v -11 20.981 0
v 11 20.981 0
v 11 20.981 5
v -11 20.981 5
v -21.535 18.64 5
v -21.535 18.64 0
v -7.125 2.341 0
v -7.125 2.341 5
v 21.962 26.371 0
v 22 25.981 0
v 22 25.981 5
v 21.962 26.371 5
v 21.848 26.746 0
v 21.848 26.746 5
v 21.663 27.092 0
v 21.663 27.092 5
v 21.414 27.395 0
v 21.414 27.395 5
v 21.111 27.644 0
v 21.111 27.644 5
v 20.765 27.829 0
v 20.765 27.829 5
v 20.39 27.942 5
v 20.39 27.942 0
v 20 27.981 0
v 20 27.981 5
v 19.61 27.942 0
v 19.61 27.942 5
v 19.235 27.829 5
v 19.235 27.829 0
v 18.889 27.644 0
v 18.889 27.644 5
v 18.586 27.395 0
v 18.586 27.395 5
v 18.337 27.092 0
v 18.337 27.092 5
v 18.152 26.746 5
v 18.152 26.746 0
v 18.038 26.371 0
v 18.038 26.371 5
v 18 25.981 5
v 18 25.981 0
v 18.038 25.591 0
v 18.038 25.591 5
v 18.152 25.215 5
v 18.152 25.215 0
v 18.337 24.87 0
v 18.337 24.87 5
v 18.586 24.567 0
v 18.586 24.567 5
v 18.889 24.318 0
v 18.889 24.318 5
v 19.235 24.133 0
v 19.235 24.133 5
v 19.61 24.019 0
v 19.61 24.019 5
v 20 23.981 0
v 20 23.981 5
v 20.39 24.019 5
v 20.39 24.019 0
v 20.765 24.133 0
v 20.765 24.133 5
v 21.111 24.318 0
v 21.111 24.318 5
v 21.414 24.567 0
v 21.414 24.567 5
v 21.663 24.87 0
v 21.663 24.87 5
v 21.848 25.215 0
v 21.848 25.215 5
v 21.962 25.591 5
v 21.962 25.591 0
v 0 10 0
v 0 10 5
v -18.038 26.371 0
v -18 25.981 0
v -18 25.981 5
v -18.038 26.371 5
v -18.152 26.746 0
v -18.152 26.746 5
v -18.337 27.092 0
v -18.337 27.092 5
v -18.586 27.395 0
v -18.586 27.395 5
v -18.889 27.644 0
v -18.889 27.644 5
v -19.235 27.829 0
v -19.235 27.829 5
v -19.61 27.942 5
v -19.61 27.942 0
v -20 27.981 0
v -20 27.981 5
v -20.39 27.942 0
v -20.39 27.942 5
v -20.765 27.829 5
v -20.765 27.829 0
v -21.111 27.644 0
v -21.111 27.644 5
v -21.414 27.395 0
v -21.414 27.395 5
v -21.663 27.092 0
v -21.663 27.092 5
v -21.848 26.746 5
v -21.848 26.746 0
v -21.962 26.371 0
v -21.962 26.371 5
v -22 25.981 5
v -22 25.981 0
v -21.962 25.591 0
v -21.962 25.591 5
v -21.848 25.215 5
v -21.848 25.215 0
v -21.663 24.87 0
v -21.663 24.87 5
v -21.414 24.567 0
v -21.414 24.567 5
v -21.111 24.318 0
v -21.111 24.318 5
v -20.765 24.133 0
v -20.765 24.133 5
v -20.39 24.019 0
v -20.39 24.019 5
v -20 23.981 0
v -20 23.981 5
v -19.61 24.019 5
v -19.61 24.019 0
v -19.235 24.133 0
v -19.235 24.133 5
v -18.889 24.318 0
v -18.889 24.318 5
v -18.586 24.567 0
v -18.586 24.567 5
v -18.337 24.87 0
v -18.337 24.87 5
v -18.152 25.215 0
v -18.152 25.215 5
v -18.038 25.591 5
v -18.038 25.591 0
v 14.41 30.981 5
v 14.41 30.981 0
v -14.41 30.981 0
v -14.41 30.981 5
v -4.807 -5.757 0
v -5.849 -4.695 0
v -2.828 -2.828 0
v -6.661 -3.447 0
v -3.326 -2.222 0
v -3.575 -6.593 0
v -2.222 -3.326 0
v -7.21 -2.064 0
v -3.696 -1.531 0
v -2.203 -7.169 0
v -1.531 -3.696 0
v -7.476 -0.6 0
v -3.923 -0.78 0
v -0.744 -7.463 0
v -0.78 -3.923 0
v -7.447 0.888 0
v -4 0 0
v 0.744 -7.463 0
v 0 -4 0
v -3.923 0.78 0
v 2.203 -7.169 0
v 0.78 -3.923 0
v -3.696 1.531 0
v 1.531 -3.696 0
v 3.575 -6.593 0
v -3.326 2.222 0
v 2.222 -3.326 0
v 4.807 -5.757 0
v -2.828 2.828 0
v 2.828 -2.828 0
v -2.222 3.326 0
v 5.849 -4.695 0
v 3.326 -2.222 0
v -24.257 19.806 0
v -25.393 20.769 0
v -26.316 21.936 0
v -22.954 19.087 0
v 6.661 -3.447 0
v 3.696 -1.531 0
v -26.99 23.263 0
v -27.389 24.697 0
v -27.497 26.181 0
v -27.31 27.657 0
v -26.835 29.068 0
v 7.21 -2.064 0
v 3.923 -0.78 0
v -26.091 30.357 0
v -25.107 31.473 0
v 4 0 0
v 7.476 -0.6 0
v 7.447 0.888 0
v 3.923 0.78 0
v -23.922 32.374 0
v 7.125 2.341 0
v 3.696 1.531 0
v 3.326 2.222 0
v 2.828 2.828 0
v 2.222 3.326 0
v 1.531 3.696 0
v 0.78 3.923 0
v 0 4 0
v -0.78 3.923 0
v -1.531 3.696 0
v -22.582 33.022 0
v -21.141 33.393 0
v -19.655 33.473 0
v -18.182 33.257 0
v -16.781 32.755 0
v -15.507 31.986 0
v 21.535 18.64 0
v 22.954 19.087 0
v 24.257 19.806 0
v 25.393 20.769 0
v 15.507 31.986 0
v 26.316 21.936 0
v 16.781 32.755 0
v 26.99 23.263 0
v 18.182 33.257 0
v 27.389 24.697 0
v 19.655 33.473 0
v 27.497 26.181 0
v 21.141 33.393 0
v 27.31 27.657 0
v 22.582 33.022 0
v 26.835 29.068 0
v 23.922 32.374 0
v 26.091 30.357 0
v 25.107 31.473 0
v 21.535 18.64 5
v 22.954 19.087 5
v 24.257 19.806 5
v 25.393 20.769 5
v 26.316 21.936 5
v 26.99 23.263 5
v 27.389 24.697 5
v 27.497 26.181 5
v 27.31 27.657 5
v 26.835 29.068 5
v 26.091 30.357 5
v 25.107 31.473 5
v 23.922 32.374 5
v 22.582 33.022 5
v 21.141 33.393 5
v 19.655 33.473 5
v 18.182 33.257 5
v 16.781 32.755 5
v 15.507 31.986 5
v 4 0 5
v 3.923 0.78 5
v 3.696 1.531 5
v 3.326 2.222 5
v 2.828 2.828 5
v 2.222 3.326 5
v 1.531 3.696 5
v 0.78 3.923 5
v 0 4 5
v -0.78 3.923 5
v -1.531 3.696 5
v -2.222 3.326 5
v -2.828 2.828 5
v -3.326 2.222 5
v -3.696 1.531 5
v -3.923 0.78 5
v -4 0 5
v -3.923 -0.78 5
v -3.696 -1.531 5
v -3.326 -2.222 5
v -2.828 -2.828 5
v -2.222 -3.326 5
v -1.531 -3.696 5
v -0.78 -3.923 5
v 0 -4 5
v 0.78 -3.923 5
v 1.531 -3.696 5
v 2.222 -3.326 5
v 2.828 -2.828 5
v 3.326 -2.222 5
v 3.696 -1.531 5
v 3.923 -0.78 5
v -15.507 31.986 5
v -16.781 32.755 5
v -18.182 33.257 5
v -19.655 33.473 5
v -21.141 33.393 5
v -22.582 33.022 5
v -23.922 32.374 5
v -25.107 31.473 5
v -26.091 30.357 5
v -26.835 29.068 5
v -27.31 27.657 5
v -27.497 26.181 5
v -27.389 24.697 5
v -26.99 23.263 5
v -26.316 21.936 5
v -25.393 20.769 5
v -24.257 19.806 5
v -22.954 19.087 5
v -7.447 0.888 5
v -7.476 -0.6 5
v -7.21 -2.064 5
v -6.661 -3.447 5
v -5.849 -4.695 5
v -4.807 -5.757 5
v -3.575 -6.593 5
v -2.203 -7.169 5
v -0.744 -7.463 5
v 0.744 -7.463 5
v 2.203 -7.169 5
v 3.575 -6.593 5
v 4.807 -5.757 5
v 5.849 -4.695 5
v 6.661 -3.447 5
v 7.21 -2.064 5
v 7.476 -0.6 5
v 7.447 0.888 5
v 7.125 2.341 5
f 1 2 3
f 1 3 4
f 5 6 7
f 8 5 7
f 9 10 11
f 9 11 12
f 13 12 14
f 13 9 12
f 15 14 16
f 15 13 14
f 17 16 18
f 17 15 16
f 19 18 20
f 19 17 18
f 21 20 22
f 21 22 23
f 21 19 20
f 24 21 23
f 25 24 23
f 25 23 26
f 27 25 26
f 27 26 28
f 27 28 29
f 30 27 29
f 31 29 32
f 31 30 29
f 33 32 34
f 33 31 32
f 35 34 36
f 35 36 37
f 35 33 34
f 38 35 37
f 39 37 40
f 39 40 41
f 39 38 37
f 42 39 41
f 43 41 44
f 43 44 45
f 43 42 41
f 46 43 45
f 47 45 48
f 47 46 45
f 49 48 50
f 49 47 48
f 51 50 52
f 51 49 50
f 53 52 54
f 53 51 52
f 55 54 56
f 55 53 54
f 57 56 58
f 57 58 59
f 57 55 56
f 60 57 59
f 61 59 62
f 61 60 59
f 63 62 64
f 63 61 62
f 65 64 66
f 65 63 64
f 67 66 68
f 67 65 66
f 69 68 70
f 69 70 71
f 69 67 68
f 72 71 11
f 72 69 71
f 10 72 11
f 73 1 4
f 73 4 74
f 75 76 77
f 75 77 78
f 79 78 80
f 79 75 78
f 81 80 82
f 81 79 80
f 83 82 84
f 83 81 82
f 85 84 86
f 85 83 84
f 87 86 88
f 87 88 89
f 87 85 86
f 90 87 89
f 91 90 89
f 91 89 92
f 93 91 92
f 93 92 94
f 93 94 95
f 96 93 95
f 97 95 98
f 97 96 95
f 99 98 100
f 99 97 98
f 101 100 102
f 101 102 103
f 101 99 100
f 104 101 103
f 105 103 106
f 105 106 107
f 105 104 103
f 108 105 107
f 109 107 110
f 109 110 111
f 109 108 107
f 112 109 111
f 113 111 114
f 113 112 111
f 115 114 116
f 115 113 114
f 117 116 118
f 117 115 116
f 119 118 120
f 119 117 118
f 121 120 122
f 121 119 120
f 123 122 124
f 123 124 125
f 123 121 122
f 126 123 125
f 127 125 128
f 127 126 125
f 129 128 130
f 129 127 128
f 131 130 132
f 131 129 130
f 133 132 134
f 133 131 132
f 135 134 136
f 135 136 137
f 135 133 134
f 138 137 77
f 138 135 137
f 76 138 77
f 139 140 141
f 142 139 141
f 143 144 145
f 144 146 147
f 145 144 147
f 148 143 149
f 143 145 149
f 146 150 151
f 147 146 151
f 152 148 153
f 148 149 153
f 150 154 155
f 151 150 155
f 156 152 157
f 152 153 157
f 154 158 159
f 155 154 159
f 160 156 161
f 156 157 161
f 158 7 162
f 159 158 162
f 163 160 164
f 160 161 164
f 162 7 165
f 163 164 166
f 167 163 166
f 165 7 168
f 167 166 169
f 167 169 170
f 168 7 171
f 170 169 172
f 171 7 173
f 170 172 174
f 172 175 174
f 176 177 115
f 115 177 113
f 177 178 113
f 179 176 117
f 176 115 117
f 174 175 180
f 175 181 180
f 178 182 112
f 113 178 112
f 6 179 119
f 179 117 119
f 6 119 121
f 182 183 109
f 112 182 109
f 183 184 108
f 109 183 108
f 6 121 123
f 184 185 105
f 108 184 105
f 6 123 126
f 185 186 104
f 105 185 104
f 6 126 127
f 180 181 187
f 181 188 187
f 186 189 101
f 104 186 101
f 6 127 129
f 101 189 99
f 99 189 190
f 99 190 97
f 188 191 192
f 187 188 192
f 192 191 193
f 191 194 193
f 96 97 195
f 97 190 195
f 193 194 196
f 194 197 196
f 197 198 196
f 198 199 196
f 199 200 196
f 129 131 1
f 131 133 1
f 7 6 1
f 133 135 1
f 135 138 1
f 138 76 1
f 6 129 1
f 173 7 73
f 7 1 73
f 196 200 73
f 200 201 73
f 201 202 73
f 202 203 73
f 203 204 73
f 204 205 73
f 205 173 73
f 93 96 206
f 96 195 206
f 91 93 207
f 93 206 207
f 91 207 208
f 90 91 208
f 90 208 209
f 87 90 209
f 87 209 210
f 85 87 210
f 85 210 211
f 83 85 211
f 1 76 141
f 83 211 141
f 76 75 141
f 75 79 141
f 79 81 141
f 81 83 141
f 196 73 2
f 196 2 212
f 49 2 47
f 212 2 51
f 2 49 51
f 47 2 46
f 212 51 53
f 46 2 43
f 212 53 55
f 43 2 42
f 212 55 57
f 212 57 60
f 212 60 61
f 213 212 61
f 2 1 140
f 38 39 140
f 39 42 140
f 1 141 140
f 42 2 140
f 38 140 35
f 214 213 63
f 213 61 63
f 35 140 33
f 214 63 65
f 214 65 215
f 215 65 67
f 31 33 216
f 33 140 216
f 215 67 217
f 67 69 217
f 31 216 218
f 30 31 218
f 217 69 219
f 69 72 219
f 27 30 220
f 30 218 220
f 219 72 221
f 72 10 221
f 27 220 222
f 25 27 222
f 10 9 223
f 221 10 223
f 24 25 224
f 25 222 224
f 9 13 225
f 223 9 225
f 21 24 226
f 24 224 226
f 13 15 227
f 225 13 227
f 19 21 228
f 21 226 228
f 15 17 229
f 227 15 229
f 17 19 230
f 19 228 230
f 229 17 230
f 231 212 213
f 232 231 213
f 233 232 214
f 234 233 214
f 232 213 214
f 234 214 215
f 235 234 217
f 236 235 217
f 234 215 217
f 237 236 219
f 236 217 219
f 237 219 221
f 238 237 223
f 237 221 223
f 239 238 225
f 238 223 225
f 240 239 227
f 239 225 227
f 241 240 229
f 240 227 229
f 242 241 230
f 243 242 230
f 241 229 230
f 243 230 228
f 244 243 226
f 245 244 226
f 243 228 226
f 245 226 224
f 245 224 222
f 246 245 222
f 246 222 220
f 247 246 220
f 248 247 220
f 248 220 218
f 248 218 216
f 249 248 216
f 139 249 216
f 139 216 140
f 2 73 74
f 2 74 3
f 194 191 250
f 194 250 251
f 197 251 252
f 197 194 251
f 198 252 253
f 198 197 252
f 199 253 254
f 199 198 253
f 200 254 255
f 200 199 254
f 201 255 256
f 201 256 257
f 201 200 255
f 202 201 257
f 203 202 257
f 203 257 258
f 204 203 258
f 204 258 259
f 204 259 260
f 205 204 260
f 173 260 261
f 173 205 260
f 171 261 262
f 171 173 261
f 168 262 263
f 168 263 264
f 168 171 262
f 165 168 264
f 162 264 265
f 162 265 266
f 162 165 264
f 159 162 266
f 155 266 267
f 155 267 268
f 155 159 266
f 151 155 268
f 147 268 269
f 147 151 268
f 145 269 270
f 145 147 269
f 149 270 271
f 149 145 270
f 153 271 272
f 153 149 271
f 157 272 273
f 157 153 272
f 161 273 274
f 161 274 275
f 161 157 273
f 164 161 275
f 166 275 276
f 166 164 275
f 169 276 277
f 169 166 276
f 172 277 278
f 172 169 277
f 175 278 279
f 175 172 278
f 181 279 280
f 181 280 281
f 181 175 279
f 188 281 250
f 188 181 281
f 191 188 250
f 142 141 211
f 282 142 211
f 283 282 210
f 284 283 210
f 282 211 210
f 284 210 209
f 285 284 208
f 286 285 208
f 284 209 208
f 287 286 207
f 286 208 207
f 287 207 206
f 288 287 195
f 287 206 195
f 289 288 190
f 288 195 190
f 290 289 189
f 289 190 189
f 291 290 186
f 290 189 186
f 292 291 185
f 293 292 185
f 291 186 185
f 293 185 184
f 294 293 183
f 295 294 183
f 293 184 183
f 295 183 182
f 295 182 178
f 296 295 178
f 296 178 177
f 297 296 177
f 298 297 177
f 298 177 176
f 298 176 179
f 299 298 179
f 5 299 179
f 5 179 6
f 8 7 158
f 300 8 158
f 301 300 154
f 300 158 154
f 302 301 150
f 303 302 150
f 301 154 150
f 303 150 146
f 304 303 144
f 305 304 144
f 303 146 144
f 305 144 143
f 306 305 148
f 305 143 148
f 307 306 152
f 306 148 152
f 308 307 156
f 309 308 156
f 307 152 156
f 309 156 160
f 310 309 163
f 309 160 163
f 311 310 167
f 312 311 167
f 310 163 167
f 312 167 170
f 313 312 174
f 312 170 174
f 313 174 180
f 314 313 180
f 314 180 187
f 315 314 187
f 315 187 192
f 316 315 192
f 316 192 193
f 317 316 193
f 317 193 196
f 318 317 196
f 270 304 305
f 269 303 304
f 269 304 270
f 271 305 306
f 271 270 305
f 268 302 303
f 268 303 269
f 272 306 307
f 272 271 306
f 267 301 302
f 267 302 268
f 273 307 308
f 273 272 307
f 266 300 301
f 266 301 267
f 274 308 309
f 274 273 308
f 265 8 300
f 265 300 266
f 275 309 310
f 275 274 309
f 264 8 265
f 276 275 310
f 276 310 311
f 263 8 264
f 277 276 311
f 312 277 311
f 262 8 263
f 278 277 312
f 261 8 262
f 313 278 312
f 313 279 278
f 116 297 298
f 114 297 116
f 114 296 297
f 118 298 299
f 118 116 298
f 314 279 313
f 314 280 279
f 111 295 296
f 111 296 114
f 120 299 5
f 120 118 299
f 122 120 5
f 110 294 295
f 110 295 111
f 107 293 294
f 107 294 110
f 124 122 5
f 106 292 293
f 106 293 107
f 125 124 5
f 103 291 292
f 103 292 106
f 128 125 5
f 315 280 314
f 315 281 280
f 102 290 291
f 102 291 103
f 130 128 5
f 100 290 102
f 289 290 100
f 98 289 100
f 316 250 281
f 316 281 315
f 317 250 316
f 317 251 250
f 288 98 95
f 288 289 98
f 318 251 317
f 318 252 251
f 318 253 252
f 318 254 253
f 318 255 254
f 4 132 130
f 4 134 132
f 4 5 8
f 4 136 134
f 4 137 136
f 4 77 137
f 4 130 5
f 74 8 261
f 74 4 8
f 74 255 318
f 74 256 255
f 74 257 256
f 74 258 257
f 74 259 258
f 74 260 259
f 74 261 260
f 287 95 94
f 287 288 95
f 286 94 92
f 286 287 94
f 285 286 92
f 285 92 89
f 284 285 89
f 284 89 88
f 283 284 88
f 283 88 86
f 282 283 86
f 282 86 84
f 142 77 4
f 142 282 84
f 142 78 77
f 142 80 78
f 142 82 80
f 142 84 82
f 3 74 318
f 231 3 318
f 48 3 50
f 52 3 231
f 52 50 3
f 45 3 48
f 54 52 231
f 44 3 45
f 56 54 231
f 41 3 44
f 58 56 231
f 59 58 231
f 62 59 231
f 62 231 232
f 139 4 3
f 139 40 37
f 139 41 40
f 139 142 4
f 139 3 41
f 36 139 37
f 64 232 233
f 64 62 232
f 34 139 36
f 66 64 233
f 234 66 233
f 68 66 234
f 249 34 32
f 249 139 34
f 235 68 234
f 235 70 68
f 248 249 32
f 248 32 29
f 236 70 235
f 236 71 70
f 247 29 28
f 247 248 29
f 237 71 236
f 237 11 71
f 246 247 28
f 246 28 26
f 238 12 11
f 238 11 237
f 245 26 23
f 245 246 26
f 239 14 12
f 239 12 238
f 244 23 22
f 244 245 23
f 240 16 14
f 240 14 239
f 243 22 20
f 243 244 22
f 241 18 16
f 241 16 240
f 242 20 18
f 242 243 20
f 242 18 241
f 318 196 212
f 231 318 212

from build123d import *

# Parameters (mm, degrees)
SCHIZZO1_R                   = 4
SCHIZZO1_R_2                 = 2
ESTRUSIONE_ESTRUSIONE1_DEPTH = 5


with BuildPart() as part:
    # Schizzo1 → Estrusione-Estrusione1 (new body)
    with BuildSketch(Plane.XY):
        with BuildLine():
            Line((14.409830056, 30.980762114), (-14.409830056, 30.980762114))
            ThreePointArc((-14.409830056, 30.980762114), (-26.495190528, 29.730762114), (-21.535042047, 18.639532931))
            Line((-21.535042047, 18.639532931), (-7.125211991, 2.341229183))
            ThreePointArc((-7.125211991, 2.341229183), (0, -7.5), (7.125211991, 2.341229183))
            Line((7.125211991, 2.341229183), (21.535042047, 18.639532931))
            ThreePointArc((21.535042047, 18.639532931), (26.495190528, 29.730762114), (14.409830056, 30.980762114))
        make_face()
        Circle(SCHIZZO1_R, mode=Mode.SUBTRACT)
        with Locations((20, 25.980762114)):
            Circle(SCHIZZO1_R_2, mode=Mode.SUBTRACT)
        with Locations((-20, 25.980762114)):
            Circle(SCHIZZO1_R_2, mode=Mode.SUBTRACT)
        Polygon((11, 20.980762114), (-11, 20.980762114), (0, 10), align=None, mode=Mode.SUBTRACT)
    extrude(amount=ESTRUSIONE_ESTRUSIONE1_DEPTH)


solid = part.part
